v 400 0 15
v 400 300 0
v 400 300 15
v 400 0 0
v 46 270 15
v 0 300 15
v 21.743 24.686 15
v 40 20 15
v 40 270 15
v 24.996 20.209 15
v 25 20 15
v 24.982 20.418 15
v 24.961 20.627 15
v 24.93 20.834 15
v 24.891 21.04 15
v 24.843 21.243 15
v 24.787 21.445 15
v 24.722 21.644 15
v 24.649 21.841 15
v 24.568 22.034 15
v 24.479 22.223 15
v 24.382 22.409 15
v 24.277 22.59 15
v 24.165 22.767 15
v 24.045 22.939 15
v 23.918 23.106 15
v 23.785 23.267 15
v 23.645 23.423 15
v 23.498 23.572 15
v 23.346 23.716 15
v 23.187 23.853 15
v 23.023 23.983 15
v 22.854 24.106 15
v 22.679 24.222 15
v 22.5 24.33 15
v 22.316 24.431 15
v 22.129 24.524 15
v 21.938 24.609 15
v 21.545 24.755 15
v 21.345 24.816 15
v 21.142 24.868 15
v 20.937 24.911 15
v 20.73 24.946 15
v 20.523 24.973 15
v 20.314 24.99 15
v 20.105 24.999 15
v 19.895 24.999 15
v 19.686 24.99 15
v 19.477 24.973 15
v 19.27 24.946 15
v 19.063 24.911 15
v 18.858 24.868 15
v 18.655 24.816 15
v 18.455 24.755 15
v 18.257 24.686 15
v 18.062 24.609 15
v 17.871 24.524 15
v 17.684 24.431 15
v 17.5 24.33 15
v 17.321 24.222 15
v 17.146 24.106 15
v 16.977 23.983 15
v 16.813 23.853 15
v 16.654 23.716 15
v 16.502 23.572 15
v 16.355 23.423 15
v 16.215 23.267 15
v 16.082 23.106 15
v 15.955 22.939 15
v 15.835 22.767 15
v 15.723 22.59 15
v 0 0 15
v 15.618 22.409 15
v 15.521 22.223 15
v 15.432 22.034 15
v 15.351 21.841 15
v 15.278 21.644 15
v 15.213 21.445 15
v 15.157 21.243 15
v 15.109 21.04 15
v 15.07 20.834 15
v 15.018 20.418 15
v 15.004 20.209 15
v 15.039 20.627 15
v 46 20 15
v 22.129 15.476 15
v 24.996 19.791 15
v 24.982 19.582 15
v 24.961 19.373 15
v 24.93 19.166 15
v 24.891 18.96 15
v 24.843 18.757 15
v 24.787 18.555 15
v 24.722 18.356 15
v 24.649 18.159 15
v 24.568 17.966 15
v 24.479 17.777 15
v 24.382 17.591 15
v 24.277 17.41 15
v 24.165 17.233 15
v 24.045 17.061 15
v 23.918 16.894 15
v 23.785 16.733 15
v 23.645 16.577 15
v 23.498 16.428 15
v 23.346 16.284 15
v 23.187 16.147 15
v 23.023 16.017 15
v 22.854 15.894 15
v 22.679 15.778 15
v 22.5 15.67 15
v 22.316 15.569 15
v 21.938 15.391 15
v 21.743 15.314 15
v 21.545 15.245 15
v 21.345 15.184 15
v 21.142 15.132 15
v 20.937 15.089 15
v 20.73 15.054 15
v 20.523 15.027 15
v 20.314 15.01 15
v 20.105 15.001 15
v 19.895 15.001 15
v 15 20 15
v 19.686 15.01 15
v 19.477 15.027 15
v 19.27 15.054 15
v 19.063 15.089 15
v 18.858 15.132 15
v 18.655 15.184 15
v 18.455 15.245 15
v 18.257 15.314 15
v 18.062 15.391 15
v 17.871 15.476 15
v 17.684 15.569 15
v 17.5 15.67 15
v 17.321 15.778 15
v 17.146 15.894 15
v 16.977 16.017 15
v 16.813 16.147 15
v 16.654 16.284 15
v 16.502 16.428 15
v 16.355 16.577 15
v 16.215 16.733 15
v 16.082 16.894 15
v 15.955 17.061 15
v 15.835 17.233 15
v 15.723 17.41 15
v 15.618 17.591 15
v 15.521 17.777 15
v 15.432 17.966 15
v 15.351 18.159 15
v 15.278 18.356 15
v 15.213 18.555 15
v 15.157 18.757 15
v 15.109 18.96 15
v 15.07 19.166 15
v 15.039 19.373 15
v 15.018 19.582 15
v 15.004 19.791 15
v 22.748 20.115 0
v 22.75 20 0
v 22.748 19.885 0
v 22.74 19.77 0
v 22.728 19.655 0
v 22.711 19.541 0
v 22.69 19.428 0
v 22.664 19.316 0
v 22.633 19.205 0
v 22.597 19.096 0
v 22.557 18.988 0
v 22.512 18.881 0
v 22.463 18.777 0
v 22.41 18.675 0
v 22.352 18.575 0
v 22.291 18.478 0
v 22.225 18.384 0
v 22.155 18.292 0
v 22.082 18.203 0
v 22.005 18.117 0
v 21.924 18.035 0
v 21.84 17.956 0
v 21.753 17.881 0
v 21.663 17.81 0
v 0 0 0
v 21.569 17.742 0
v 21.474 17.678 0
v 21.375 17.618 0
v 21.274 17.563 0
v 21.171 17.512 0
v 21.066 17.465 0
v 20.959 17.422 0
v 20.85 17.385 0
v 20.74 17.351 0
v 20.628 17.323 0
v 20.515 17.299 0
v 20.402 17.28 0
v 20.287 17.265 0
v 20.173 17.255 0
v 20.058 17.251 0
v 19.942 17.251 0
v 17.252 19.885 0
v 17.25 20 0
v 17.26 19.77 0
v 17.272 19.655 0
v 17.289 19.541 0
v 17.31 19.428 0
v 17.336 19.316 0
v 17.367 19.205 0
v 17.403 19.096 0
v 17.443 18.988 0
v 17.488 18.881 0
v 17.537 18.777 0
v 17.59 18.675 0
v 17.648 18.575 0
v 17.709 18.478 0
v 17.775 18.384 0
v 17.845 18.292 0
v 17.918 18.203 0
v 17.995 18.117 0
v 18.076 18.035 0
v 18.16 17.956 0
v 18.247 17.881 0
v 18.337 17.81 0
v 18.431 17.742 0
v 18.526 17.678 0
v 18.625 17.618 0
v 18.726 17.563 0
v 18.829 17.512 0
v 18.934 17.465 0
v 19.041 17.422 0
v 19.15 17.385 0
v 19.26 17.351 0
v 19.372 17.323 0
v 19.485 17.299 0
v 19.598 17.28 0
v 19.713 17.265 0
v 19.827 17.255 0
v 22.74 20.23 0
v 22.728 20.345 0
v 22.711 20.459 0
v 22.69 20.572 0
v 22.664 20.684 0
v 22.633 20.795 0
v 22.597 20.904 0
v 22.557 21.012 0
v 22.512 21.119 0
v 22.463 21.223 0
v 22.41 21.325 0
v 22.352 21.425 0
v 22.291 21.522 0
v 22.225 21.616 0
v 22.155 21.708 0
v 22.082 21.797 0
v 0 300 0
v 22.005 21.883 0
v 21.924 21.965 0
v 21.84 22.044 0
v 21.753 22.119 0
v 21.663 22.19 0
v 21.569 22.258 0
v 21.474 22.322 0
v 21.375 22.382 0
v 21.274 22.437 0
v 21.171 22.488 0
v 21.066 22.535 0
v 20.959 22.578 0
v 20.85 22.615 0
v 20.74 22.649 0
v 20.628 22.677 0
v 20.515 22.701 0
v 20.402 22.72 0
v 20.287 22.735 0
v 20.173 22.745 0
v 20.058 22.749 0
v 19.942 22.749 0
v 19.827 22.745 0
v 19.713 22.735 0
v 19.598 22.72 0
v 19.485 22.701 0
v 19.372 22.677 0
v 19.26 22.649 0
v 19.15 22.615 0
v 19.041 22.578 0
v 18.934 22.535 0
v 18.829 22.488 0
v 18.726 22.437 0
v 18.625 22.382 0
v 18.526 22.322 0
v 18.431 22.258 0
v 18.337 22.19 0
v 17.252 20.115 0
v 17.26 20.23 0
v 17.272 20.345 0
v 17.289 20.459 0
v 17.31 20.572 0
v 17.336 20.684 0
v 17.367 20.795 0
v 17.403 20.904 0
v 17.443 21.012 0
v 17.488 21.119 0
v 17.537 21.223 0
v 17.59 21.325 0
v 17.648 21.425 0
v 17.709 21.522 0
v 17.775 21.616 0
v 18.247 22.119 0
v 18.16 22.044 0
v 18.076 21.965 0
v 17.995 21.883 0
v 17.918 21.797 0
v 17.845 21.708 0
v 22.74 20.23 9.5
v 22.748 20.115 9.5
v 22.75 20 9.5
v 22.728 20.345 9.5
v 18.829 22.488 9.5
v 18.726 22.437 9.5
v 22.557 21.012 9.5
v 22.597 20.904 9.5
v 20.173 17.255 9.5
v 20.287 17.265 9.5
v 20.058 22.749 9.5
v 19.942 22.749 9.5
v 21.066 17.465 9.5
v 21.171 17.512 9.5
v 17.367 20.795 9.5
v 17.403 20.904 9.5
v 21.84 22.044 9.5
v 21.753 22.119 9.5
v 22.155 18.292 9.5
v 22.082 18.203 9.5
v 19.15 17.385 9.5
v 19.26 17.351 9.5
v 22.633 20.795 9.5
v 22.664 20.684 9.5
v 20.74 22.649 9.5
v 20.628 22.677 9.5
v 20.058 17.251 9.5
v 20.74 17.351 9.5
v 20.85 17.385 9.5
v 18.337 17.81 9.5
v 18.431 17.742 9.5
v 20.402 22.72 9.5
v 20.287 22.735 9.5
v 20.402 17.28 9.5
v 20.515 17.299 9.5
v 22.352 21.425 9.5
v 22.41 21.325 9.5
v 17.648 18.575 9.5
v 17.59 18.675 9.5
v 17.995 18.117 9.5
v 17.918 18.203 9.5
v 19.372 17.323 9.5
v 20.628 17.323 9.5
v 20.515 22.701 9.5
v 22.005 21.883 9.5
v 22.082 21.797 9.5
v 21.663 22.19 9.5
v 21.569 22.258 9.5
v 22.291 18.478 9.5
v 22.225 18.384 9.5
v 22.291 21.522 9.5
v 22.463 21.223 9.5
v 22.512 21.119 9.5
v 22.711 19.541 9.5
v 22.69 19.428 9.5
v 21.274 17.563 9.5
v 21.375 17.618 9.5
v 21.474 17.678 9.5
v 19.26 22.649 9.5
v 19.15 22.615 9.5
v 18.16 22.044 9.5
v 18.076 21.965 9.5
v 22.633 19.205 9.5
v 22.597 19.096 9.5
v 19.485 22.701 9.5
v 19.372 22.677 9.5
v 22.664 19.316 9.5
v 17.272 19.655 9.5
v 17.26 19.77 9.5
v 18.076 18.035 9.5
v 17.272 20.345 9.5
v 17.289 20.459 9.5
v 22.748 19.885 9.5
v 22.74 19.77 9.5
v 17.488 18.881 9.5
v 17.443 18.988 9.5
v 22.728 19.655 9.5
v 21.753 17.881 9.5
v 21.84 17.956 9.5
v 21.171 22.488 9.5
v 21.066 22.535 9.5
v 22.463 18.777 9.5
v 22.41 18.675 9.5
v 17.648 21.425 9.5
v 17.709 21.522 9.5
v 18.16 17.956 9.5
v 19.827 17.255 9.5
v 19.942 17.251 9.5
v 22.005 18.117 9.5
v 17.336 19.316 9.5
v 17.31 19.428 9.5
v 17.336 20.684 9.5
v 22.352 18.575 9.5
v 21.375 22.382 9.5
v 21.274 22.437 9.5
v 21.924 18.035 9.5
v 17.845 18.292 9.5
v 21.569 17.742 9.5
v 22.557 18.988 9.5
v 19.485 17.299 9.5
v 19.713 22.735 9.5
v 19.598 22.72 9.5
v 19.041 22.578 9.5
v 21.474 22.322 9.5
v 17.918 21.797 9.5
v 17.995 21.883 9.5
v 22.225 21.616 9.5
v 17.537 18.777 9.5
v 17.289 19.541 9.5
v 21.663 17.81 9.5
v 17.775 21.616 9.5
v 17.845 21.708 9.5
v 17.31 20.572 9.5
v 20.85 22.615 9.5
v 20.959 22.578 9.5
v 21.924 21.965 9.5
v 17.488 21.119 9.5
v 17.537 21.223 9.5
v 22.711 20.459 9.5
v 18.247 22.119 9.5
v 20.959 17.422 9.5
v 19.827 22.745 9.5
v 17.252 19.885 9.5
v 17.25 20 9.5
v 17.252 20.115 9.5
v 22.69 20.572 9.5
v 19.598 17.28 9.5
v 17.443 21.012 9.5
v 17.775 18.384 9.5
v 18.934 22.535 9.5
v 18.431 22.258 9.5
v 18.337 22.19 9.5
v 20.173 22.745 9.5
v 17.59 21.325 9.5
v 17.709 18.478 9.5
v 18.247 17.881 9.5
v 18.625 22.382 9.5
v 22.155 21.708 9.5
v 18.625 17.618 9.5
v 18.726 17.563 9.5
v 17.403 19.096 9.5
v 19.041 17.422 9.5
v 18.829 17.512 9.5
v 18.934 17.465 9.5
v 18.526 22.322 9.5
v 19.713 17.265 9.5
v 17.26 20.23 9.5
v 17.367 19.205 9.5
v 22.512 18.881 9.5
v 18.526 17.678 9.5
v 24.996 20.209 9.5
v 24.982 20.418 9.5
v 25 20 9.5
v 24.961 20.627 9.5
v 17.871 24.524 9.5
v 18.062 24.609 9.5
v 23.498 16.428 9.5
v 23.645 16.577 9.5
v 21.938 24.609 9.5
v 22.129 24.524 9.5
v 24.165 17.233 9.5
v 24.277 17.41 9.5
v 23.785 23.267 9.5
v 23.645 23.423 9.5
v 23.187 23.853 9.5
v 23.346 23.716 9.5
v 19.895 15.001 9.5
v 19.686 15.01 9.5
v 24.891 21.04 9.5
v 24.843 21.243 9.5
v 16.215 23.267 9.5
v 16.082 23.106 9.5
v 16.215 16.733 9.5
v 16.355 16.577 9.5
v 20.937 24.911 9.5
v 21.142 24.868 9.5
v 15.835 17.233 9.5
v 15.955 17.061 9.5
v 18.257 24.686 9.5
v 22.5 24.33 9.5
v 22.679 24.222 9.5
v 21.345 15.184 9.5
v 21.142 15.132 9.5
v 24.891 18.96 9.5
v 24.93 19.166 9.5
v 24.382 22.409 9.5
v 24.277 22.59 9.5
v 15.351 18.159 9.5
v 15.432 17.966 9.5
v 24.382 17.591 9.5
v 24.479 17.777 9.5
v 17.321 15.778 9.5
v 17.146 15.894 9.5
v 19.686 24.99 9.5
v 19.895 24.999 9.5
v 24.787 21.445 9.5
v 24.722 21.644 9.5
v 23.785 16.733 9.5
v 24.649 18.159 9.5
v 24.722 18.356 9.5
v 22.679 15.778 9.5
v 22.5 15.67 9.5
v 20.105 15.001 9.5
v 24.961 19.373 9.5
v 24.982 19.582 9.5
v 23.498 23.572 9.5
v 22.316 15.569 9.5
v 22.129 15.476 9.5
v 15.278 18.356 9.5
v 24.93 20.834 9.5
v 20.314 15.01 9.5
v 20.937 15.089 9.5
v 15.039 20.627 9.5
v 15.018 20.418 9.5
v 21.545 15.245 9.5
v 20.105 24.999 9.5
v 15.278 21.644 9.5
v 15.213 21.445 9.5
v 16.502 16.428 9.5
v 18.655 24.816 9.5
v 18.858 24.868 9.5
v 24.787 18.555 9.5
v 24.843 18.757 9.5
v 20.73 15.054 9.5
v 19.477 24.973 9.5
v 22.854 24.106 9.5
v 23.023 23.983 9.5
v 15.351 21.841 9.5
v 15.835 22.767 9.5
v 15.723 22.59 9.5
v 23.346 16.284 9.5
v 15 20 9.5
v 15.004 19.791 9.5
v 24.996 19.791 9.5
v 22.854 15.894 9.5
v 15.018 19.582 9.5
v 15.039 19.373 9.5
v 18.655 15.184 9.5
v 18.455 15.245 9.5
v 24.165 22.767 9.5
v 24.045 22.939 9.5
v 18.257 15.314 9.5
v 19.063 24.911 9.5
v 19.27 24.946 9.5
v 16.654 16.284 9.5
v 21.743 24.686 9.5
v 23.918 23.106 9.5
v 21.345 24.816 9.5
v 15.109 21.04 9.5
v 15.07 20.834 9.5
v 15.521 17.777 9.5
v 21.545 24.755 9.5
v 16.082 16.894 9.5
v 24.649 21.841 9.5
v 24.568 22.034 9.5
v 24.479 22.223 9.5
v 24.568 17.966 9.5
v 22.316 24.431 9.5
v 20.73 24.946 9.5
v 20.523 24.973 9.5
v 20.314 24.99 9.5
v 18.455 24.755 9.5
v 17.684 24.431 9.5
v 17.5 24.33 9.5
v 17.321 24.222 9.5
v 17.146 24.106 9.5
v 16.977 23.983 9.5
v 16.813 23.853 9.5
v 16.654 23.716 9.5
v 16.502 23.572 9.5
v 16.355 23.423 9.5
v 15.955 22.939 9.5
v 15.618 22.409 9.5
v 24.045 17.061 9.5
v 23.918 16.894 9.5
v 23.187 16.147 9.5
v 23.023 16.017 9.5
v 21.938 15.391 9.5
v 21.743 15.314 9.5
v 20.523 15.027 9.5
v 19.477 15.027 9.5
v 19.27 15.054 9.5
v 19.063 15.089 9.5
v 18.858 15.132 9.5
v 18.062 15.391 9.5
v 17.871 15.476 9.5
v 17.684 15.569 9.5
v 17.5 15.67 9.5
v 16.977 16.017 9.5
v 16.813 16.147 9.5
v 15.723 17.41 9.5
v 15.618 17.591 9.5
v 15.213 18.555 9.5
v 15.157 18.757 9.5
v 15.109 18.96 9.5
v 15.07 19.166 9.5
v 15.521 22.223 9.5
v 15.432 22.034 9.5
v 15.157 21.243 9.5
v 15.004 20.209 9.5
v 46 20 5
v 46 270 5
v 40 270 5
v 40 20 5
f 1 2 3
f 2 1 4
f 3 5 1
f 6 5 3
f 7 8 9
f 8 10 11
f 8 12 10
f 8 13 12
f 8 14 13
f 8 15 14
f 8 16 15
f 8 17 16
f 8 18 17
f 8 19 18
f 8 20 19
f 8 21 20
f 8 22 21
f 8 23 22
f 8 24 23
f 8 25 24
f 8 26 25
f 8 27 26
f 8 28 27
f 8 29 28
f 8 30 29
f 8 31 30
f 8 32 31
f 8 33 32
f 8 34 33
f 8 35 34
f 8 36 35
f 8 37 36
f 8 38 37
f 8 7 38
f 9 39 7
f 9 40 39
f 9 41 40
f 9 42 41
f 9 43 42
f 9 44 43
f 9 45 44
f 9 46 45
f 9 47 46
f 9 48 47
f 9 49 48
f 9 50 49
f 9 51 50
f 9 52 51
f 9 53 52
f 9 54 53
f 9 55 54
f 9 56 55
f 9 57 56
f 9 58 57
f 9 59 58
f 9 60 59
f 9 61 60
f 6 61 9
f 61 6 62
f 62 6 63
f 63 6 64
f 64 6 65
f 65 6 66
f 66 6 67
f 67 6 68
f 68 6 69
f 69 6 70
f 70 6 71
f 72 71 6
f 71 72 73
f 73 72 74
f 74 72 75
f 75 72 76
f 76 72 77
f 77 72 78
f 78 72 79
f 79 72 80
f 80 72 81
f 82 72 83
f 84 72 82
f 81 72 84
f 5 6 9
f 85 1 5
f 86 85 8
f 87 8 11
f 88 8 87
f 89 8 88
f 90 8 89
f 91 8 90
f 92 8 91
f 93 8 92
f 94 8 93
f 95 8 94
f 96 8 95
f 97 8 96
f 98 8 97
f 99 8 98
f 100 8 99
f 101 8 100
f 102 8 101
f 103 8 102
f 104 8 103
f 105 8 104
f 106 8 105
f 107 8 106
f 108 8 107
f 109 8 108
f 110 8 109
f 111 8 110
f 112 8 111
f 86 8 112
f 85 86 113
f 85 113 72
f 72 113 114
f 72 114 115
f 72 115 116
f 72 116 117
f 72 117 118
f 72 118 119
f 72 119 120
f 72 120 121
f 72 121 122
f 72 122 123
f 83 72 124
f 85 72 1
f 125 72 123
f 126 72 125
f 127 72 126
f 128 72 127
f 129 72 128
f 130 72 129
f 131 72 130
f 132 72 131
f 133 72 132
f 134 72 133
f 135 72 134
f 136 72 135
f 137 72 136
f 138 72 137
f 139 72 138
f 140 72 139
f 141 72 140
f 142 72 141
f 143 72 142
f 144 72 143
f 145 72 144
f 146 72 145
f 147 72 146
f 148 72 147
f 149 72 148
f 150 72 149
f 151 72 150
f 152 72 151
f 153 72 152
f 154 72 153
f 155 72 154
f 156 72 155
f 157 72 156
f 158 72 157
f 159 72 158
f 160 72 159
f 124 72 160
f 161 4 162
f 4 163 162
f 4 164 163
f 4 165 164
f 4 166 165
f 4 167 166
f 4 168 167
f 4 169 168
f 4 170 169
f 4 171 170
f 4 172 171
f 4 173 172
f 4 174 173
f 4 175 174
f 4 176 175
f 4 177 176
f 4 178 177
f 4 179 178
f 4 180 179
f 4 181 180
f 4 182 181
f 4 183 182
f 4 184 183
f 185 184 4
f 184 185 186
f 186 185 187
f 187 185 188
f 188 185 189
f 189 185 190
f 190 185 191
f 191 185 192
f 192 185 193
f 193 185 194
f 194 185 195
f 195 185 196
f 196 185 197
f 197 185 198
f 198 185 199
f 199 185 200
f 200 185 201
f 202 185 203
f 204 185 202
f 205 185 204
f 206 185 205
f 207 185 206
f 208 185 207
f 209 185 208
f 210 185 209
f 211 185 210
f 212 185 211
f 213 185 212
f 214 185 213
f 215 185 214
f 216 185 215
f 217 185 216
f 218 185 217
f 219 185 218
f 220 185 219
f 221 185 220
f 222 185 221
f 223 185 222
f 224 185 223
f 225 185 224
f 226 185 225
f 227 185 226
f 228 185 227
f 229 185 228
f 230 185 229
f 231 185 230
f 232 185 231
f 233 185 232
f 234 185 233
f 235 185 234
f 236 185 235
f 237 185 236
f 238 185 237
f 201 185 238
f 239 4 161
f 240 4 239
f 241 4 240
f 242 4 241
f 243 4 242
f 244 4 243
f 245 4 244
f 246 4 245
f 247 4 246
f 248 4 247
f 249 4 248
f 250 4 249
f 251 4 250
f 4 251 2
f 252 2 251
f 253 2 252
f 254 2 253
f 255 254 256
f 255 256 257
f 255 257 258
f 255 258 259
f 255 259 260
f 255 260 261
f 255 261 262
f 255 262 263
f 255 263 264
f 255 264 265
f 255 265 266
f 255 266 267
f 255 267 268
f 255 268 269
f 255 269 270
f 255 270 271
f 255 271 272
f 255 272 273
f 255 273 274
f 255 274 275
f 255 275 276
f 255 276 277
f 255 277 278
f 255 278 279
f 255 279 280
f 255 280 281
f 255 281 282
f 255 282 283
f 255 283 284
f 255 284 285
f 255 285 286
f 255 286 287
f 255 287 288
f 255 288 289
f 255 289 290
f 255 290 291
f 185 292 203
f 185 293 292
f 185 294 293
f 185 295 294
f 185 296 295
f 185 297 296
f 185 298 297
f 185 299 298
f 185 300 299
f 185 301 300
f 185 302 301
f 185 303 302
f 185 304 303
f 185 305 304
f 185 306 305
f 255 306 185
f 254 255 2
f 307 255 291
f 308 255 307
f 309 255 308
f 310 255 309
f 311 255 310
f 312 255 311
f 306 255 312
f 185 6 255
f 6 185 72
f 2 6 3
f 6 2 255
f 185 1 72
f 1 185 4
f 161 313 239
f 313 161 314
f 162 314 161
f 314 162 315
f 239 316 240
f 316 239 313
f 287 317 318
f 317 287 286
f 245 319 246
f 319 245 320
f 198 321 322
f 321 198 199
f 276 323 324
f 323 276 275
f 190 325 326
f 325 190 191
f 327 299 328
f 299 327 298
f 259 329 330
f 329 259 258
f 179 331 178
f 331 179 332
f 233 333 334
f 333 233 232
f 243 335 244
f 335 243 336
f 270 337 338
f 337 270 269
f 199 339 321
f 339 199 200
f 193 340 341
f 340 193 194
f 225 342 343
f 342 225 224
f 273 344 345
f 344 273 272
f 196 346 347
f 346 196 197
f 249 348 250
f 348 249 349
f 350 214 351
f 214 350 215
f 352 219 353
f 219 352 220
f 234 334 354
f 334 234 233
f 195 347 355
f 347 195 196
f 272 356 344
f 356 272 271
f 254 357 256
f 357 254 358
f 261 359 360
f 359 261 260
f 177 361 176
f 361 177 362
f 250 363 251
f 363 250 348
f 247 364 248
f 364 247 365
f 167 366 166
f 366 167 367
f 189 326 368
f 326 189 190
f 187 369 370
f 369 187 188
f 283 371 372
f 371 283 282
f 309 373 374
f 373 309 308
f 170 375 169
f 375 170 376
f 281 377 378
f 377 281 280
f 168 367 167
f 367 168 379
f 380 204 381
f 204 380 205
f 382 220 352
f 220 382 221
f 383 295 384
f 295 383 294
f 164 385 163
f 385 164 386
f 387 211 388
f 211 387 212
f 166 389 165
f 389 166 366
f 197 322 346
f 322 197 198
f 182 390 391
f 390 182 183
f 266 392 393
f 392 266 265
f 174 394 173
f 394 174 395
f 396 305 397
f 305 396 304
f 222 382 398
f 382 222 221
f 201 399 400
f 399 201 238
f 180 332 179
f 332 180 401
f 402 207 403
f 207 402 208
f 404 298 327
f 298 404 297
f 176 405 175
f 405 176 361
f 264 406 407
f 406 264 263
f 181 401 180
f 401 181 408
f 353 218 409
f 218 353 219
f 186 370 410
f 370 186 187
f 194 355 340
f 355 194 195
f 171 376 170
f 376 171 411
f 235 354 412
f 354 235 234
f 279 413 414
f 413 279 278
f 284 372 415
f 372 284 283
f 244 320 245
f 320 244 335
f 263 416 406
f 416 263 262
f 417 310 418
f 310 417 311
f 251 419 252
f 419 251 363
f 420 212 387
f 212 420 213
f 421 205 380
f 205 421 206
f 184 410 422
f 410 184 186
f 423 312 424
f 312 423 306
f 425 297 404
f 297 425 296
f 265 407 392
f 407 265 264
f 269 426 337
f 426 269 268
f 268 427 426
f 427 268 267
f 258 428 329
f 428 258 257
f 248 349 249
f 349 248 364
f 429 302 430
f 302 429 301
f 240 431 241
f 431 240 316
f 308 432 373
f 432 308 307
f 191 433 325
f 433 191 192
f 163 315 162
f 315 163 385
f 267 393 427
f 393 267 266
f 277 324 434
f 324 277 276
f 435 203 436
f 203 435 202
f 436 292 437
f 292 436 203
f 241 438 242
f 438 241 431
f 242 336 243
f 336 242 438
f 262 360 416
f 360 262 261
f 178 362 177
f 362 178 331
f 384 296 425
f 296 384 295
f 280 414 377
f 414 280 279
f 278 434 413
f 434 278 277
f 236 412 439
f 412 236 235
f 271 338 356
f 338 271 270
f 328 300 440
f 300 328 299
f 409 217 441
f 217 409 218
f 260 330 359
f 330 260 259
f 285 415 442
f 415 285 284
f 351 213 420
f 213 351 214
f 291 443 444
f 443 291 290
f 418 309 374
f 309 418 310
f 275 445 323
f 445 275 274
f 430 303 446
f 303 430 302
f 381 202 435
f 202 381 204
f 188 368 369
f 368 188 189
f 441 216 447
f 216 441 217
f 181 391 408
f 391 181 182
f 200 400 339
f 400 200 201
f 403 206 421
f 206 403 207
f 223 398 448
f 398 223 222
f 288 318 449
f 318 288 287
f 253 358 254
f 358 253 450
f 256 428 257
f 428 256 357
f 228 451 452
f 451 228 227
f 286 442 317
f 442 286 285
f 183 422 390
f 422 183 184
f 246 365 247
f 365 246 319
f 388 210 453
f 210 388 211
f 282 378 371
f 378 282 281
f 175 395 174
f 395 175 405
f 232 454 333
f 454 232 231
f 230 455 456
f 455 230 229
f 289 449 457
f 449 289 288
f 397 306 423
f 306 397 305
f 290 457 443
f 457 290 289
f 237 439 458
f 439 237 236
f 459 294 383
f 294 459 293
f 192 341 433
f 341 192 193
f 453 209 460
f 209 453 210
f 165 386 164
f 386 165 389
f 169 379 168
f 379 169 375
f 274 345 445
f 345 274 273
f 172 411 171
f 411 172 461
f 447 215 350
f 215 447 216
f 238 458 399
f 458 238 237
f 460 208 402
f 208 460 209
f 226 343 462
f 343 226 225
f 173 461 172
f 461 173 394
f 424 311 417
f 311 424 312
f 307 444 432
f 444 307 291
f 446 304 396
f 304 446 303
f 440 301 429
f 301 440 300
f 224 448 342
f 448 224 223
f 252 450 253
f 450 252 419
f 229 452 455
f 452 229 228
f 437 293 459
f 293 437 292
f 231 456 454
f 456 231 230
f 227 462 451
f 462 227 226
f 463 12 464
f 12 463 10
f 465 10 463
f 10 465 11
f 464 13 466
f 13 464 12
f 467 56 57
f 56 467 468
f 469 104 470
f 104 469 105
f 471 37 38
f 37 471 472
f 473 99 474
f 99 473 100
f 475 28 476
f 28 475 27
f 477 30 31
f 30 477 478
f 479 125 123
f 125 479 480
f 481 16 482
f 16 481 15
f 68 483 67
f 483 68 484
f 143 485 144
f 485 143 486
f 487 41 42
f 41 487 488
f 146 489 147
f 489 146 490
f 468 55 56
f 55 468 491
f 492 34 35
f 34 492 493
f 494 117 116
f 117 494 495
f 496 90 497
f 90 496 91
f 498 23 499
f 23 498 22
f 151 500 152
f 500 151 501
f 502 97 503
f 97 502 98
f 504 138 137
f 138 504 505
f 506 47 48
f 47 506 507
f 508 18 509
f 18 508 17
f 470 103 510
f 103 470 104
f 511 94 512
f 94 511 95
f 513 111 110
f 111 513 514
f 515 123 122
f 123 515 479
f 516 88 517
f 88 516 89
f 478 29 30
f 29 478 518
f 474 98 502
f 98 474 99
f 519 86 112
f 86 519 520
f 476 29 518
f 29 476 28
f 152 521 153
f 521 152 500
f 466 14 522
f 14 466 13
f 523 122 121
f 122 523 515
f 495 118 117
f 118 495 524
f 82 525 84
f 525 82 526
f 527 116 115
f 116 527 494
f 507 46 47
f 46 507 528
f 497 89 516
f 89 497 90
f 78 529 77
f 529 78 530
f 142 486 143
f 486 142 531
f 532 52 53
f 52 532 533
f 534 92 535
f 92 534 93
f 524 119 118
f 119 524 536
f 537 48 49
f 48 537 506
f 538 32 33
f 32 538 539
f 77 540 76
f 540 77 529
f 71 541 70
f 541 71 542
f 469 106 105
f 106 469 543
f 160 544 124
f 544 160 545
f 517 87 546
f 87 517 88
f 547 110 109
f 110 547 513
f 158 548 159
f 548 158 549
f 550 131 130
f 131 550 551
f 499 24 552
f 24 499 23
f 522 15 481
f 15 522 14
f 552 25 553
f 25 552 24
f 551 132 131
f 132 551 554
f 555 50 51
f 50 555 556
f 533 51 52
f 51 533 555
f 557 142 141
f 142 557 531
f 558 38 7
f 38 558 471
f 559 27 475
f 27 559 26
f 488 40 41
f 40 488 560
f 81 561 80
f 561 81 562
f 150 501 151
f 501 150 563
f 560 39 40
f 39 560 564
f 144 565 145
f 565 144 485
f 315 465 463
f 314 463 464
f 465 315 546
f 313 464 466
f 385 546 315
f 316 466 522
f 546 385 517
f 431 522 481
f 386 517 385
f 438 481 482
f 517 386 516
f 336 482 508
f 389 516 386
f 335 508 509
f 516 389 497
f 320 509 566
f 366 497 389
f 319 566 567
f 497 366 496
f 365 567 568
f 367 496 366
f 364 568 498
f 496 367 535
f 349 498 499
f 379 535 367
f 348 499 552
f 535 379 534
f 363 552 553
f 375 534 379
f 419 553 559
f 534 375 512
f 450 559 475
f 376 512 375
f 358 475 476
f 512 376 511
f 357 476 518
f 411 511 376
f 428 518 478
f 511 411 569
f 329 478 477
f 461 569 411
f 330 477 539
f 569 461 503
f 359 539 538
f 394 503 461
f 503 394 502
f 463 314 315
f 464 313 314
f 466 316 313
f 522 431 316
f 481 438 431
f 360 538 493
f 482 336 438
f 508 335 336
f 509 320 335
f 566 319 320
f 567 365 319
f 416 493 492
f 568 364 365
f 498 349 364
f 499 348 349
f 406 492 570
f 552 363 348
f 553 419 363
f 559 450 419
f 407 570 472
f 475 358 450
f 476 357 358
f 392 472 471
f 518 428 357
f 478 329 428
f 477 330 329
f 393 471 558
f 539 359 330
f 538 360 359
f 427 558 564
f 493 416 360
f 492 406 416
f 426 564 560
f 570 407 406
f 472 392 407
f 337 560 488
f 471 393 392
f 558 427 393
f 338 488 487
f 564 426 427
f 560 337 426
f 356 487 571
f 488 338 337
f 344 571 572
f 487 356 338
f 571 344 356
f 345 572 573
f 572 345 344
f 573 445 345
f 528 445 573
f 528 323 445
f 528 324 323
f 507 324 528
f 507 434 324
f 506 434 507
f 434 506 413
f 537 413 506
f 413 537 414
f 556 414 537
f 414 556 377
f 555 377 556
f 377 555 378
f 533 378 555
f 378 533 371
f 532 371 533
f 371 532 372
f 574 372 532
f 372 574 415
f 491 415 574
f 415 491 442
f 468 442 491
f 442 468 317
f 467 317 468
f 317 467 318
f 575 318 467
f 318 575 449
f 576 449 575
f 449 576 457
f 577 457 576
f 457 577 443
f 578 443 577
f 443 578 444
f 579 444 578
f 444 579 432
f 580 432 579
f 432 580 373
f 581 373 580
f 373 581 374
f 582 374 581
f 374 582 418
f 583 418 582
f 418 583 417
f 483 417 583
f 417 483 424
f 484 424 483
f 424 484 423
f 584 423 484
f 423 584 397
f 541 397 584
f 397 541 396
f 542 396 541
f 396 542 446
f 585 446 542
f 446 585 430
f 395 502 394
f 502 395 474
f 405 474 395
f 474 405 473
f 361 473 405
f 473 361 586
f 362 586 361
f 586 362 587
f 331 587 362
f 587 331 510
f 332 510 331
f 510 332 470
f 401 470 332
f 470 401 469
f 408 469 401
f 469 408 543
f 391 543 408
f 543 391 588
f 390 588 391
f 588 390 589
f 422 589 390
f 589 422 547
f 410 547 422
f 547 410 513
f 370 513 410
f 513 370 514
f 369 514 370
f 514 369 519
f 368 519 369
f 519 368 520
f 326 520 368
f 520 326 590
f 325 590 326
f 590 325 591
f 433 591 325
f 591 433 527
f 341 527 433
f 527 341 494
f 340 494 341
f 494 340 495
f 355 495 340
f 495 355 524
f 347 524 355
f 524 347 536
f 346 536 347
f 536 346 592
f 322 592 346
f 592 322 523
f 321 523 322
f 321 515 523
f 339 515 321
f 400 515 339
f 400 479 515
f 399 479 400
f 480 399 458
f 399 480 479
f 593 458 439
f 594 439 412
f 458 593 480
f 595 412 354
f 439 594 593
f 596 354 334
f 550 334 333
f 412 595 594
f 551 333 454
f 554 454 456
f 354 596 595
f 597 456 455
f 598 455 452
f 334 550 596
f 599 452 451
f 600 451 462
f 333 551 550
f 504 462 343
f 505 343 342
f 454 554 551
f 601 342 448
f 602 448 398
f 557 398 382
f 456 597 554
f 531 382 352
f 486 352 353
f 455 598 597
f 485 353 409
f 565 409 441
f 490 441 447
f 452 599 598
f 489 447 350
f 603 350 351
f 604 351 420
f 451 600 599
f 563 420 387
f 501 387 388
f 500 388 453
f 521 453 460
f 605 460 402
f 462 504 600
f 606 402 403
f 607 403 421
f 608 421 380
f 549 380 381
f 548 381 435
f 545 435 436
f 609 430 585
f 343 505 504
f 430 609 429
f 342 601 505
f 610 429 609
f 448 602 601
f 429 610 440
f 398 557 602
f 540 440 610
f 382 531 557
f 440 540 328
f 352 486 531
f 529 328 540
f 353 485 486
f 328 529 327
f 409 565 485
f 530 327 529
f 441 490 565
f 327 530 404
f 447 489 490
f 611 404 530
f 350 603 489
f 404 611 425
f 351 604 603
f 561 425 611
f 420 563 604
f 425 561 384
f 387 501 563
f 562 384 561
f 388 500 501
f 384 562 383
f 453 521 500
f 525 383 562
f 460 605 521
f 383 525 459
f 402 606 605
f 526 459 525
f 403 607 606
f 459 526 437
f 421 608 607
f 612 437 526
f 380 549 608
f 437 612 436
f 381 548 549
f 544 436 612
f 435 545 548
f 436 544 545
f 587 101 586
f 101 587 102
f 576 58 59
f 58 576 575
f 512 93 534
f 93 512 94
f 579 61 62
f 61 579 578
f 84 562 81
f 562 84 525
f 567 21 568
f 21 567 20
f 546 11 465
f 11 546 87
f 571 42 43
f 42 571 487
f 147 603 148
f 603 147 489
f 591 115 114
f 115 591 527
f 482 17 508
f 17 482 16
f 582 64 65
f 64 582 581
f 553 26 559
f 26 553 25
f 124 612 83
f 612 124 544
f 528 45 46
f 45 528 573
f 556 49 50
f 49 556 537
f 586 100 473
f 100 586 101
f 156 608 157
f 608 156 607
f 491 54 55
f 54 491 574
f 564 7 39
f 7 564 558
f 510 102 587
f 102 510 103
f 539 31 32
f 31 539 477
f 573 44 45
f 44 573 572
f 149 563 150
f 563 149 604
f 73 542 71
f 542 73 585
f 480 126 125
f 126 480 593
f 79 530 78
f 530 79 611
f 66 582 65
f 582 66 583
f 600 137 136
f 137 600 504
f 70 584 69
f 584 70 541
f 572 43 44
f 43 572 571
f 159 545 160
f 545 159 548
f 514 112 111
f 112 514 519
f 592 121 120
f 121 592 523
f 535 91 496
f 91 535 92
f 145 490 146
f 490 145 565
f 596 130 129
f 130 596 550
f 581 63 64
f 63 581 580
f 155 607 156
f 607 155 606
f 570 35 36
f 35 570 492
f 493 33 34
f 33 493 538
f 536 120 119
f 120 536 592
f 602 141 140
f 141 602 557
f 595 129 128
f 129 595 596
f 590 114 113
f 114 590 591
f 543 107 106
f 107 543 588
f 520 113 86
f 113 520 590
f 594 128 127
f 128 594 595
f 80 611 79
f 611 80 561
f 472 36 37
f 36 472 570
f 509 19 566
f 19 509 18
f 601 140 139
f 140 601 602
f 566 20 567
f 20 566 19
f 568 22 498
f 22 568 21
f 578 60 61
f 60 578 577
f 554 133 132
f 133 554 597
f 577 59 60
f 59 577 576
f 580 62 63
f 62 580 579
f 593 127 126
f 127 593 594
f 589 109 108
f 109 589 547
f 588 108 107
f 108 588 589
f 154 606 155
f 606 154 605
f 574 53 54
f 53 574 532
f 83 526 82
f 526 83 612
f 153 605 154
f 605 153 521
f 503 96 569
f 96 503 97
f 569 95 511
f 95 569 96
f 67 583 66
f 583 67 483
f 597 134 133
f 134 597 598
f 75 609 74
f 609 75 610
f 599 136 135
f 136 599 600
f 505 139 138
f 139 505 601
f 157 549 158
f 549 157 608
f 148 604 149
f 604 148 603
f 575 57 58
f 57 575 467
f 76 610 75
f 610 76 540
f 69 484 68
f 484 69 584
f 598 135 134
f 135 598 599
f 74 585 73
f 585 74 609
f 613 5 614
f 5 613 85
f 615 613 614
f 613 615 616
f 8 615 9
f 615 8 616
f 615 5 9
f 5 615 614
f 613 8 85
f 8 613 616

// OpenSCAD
// Generated by SolidPython 1.0.4 on 2021-01-27 22:50:45
$fn = 150;


difference() {
	cube(size = [400, 300, 15]);
	translate(v = [20, 20, 0]) {
		cylinder(d = 5.5000000000, h = 15);
	}
	translate(v = [20, 20, 9.5000000000]) {
		cylinder(d = 10, h = 5.5000000000);
	}
	translate(v = [40, 20, 5]) {
		cube(size = [6, 250, 10]);
	}
}
/***********************************************
*********      SolidPython code:      **********
************************************************
 
from collections import namedtuple
from typing import NamedTuple
import json
from pathlib import Path

import click
from solid import *
from solid.utils import *  # Not required, but the utils module is useful

import_scad('MCAD/units.scad')



SEGMENTS = 150


def plate_with_holes(form, dimensions, holes):
    """
    Create a plate with holes
    """
    plate = {
        "circle": cylinder(d=dimensions["diameter"], h=dimensions["thickness"]),
        "square": cube([dimensions["width"], dimensions["height"], dimensions["thickness"]])
    }
    return difference()(
        plate[form],
        [
            h.create() for h in holes
        ]
    )


class Pocket(NamedTuple):
    width: float
    length: float
    x: float
    y: float
    z: float
    depth: float

    @property
    def create(self):
        return translate([self.x, self.y, self.z])(
            cube([self.width, self.length, self.depth])
        )


class Hole(NamedTuple):
    diameter: float
    x: float
    y: float
    z: float
    depth: float

    @property
    def create(self):
        return translate([self.x, self.y, self.z])(
            cylinder(d=self.diameter, h=self.depth)
        )


@click.command()
@click.argument('filename', required=True, type=click.STRING)
def create(filename):
    """
    Generate a scad file of a plate with optional holes in it.
    First define the overall geometry: "circle" or "square", then declare the holes.

    The json file must have a certain structure, i.e.:

    {
        "width": 400,
        "height": 300,
        "thickness": 15,
        "holes": [
            {
                "label": "H1",
                "diameter": 5.5,
                "x_pos": 20,
                "y_pos": 20,
                "z_pos": 0,
                "depth": 15
            },
            ...
        ]
    }
    """
    p = Path(filename)
    click.echo(f'Generating {p.stem}.scad')
    with open(filename) as f:
        data = json.load(f)
        if "holes" in data:
            if "thickness" in data:
                holes = [
                    Hole(
                        h["diameter"], h["x_pos"], h["y_pos"], h["z_pos"], h["depth"]
                    ) if "diameter" in h else Pocket(
                        h["width"], h["length"], h["x_pos"], h["y_pos"], h["z_pos"], h["depth"]
                    ) for h in data["holes"]
                ]
                scad_render_to_file(
                    plate_with_holes(
                        data["form"] if "form" in data else "square",
                        {
                        "width": data["width"] if "width" in data else None,
                        "height": data["height"] if "height" in data else None,
                        "diameter": data["diameter"] if "diameter" in data else None,
                        "thickness": data["thickness"]
                        },
                        holes
                    ),
                    file_header=f'$fn = {SEGMENTS};',
                    filepath=f'{p.stem}.scad'
                )
                click.echo('Processing complete.')
            else:
                click.echo('Declare the thickness of your plate.')
                click.echo('Process aborted.')
        else:
            click.echo('You must include some holes in your plate!')
            click.echo('Process aborted.')
    


if __name__ == '__main__':
    create() 
 
************************************************/
